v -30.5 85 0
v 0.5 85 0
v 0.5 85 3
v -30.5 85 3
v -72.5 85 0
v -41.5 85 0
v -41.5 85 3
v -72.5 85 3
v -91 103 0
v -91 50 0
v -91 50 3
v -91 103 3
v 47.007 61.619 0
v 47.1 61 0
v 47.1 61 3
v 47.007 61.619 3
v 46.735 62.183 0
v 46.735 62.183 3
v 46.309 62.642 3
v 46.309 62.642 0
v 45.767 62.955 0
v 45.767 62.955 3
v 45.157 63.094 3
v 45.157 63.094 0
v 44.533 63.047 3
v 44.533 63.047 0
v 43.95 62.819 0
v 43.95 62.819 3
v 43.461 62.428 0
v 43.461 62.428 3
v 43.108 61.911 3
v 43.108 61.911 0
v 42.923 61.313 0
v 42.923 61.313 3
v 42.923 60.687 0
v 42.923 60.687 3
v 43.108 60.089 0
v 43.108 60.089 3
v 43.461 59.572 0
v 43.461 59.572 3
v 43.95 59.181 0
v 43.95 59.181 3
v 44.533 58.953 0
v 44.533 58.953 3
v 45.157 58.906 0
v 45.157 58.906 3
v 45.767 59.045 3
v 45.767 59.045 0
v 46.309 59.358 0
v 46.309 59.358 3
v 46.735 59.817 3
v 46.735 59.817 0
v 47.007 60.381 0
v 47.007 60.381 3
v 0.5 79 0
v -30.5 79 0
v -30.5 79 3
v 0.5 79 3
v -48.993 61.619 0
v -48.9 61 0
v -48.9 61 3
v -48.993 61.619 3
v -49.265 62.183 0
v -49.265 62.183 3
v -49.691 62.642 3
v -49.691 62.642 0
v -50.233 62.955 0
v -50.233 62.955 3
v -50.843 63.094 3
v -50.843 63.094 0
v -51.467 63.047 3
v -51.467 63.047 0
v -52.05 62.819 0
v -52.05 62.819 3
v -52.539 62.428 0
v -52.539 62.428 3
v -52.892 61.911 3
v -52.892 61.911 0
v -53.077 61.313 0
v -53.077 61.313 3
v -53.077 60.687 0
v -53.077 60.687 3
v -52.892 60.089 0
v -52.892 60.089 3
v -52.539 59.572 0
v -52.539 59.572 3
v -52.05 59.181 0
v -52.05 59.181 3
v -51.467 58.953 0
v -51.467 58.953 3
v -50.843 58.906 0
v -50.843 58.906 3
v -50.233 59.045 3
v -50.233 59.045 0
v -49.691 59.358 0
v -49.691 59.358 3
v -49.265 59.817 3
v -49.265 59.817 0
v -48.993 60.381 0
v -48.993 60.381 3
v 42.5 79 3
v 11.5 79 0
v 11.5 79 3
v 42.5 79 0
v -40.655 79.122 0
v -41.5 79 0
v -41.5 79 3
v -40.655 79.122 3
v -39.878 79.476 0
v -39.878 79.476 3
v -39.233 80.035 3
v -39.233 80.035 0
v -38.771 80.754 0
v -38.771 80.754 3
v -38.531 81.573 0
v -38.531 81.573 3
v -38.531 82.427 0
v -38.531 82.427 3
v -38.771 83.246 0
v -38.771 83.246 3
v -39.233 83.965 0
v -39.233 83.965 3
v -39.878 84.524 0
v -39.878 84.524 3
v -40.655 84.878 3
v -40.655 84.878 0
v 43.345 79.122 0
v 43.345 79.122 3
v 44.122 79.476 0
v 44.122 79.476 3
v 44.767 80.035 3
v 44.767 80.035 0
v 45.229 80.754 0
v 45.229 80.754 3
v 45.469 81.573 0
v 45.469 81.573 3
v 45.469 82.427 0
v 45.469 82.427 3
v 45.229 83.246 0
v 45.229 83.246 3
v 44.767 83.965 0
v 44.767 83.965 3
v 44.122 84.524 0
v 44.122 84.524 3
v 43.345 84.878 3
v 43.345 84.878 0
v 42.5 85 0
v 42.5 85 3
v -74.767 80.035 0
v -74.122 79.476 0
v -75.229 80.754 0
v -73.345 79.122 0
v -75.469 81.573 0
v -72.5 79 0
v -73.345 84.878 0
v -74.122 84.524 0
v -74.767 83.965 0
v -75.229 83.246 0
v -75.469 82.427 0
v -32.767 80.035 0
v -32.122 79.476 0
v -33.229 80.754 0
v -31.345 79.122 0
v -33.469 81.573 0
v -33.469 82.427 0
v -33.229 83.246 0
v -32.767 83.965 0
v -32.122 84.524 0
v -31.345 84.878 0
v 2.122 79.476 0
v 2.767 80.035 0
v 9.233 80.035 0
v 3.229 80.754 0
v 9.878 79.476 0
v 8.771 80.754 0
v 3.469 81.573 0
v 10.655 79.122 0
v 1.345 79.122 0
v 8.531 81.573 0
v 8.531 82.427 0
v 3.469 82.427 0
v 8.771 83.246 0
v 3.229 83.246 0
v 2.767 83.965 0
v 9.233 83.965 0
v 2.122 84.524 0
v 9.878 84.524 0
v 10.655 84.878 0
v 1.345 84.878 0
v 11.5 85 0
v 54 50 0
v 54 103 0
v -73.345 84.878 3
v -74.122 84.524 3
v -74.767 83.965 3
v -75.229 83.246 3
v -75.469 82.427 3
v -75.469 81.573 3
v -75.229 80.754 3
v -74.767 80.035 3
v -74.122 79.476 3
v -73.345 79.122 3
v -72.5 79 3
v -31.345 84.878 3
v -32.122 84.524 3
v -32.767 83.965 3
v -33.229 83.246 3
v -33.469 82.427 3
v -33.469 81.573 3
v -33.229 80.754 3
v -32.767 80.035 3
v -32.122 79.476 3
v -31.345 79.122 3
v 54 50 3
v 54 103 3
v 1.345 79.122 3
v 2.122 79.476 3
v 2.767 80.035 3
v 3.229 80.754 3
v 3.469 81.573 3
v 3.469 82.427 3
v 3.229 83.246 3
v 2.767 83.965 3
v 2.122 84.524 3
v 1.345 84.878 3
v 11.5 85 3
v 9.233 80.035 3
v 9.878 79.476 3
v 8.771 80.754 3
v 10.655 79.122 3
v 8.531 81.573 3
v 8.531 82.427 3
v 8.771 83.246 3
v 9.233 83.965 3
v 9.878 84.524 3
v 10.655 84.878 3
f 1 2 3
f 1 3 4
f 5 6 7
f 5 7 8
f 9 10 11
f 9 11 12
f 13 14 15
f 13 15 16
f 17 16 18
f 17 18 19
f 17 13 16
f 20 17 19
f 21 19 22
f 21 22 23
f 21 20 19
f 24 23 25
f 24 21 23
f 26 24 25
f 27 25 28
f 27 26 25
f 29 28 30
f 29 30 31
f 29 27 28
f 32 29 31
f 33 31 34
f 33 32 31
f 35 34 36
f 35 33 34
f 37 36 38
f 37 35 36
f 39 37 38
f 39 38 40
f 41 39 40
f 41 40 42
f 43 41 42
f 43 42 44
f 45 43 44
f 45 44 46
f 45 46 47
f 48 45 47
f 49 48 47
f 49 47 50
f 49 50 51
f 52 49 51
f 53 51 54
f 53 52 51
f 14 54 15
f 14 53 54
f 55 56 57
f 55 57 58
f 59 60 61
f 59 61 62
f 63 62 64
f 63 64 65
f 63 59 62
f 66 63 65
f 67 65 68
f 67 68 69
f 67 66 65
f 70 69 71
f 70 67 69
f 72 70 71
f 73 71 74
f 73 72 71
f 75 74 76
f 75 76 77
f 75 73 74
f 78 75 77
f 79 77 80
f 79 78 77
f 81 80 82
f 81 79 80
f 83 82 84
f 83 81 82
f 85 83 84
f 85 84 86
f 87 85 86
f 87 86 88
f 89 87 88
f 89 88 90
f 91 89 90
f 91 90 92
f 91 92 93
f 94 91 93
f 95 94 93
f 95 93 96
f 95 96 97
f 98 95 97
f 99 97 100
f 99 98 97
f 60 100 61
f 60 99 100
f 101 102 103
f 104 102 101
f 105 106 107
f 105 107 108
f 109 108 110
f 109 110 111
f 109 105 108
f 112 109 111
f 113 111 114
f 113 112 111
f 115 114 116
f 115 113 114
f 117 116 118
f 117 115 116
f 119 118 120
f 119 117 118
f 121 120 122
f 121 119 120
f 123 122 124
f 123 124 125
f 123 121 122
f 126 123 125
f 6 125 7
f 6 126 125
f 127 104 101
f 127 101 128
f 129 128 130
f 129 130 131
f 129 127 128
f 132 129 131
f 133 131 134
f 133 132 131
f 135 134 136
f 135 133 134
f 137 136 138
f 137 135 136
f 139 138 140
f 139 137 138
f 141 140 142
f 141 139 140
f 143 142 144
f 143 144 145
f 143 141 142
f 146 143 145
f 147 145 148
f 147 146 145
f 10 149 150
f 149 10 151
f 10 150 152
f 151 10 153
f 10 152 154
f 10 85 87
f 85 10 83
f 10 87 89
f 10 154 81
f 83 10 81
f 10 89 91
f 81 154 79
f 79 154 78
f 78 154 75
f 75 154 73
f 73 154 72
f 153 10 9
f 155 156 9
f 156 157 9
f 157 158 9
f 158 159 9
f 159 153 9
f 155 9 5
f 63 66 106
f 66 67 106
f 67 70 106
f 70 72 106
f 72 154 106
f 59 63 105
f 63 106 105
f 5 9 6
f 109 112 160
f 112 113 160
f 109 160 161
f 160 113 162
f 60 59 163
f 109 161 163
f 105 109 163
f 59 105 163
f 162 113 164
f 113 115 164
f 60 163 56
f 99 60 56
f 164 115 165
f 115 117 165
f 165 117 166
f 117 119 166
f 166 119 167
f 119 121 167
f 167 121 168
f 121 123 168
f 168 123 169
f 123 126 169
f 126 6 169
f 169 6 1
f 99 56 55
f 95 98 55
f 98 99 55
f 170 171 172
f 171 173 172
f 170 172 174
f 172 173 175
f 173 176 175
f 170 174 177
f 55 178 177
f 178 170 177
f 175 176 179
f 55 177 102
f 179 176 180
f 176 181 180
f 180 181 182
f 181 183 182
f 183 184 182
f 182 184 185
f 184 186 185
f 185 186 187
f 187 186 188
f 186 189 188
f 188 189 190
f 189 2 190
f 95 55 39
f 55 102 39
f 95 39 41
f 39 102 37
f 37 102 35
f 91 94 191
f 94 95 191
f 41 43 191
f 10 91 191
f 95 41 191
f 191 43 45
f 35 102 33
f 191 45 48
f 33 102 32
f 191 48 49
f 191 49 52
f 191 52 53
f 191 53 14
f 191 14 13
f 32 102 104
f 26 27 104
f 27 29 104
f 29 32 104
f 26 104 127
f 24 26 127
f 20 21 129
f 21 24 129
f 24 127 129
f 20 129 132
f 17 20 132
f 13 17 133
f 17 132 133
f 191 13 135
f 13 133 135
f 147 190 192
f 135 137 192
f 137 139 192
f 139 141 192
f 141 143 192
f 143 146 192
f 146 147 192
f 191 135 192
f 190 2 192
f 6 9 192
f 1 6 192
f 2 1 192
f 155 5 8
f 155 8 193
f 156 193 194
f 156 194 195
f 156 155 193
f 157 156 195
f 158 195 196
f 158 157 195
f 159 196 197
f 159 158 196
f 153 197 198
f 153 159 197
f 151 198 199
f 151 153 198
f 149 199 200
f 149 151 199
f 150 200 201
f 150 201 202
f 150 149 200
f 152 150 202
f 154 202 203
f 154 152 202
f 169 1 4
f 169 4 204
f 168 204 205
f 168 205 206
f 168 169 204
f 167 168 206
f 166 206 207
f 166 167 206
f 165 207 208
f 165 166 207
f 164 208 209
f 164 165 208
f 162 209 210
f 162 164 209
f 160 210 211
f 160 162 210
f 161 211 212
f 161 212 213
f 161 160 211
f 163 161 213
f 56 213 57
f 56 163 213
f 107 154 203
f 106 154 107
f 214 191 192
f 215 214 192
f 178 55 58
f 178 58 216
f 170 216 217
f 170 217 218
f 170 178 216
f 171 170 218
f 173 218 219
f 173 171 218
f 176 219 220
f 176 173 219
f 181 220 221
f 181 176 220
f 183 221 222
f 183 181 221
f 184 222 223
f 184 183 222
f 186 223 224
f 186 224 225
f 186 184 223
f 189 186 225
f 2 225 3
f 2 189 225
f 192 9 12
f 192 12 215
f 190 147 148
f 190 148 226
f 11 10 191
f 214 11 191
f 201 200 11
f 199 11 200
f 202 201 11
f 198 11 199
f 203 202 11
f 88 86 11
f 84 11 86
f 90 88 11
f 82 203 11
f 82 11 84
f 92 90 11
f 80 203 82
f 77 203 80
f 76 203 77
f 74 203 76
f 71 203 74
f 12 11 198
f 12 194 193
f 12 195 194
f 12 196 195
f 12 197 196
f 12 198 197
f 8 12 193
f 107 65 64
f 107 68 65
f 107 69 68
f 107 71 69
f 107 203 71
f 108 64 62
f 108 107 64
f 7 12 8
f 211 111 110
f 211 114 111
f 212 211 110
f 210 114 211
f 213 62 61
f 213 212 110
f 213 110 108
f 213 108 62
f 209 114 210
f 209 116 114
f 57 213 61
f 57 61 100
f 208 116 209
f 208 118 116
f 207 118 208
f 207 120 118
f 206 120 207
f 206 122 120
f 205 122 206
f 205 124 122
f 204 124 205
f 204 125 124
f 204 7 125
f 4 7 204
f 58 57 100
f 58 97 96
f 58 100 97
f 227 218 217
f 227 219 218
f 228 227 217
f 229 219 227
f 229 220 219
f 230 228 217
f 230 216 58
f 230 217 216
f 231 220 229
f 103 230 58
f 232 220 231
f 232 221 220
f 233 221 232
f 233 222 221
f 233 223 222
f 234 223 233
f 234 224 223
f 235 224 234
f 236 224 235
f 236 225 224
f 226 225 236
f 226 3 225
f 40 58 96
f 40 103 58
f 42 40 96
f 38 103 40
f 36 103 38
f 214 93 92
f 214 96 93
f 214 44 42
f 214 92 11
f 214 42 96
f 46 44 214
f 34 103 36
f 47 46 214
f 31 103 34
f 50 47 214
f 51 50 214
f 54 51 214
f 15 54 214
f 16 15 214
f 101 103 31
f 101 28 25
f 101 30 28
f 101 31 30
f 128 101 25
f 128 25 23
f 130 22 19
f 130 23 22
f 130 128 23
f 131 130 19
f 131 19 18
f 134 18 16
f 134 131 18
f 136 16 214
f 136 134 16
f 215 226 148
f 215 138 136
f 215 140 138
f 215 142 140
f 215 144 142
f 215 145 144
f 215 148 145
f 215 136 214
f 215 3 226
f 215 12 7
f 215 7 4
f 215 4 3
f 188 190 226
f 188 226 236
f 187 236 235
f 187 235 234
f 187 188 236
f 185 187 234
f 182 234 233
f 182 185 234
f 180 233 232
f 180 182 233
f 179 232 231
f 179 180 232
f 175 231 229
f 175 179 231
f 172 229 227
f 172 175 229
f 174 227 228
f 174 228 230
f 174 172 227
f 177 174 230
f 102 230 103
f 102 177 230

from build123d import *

# Parameters (mm, degrees)
LID_RISER_WITH_VENTS_PROFILE_W = 145
LID_RISER_WITH_VENTS_PROFILE_H = 53
LID_RISER_WITH_VENTS_PROFILE_R = 2.1
LID_RISER_WITH_VENTS_DEPTH     = 3


with BuildPart() as part:
    # Lid riser with vents profile → Lid riser with vents (new body)
    with BuildSketch(Plane.XY):
        with Locations((-18.5, 76.5)):
            Rectangle(LID_RISER_WITH_VENTS_PROFILE_W, LID_RISER_WITH_VENTS_PROFILE_H)
        with Locations((-51, 61)):
            Circle(LID_RISER_WITH_VENTS_PROFILE_R, mode=Mode.SUBTRACT)
        with Locations((45, 61)):
            Circle(LID_RISER_WITH_VENTS_PROFILE_R, mode=Mode.SUBTRACT)
        with BuildLine():
            Line((-72.5, 79), (-41.5, 79))
            ThreePointArc((-41.5, 79), (-38.5, 82), (-41.5, 85))
            Line((-41.5, 85), (-72.5, 85))
            ThreePointArc((-72.5, 85), (-75.5, 82), (-72.5, 79))
        make_face(mode=Mode.SUBTRACT)
        with BuildLine():
            Line((-30.5, 79), (0.5, 79))
            ThreePointArc((0.5, 79), (3.5, 82), (0.5, 85))
            Line((0.5, 85), (-30.5, 85))
            ThreePointArc((-30.5, 85), (-33.5, 82), (-30.5, 79))
        make_face(mode=Mode.SUBTRACT)
        with BuildLine():
            Line((11.5, 79), (42.5, 79))
            ThreePointArc((42.5, 79), (45.5, 82), (42.5, 85))
            Line((42.5, 85), (11.5, 85))
            ThreePointArc((11.5, 85), (8.5, 82), (11.5, 79))
        make_face(mode=Mode.SUBTRACT)
    extrude(amount=LID_RISER_WITH_VENTS_DEPTH)


solid = part.part
